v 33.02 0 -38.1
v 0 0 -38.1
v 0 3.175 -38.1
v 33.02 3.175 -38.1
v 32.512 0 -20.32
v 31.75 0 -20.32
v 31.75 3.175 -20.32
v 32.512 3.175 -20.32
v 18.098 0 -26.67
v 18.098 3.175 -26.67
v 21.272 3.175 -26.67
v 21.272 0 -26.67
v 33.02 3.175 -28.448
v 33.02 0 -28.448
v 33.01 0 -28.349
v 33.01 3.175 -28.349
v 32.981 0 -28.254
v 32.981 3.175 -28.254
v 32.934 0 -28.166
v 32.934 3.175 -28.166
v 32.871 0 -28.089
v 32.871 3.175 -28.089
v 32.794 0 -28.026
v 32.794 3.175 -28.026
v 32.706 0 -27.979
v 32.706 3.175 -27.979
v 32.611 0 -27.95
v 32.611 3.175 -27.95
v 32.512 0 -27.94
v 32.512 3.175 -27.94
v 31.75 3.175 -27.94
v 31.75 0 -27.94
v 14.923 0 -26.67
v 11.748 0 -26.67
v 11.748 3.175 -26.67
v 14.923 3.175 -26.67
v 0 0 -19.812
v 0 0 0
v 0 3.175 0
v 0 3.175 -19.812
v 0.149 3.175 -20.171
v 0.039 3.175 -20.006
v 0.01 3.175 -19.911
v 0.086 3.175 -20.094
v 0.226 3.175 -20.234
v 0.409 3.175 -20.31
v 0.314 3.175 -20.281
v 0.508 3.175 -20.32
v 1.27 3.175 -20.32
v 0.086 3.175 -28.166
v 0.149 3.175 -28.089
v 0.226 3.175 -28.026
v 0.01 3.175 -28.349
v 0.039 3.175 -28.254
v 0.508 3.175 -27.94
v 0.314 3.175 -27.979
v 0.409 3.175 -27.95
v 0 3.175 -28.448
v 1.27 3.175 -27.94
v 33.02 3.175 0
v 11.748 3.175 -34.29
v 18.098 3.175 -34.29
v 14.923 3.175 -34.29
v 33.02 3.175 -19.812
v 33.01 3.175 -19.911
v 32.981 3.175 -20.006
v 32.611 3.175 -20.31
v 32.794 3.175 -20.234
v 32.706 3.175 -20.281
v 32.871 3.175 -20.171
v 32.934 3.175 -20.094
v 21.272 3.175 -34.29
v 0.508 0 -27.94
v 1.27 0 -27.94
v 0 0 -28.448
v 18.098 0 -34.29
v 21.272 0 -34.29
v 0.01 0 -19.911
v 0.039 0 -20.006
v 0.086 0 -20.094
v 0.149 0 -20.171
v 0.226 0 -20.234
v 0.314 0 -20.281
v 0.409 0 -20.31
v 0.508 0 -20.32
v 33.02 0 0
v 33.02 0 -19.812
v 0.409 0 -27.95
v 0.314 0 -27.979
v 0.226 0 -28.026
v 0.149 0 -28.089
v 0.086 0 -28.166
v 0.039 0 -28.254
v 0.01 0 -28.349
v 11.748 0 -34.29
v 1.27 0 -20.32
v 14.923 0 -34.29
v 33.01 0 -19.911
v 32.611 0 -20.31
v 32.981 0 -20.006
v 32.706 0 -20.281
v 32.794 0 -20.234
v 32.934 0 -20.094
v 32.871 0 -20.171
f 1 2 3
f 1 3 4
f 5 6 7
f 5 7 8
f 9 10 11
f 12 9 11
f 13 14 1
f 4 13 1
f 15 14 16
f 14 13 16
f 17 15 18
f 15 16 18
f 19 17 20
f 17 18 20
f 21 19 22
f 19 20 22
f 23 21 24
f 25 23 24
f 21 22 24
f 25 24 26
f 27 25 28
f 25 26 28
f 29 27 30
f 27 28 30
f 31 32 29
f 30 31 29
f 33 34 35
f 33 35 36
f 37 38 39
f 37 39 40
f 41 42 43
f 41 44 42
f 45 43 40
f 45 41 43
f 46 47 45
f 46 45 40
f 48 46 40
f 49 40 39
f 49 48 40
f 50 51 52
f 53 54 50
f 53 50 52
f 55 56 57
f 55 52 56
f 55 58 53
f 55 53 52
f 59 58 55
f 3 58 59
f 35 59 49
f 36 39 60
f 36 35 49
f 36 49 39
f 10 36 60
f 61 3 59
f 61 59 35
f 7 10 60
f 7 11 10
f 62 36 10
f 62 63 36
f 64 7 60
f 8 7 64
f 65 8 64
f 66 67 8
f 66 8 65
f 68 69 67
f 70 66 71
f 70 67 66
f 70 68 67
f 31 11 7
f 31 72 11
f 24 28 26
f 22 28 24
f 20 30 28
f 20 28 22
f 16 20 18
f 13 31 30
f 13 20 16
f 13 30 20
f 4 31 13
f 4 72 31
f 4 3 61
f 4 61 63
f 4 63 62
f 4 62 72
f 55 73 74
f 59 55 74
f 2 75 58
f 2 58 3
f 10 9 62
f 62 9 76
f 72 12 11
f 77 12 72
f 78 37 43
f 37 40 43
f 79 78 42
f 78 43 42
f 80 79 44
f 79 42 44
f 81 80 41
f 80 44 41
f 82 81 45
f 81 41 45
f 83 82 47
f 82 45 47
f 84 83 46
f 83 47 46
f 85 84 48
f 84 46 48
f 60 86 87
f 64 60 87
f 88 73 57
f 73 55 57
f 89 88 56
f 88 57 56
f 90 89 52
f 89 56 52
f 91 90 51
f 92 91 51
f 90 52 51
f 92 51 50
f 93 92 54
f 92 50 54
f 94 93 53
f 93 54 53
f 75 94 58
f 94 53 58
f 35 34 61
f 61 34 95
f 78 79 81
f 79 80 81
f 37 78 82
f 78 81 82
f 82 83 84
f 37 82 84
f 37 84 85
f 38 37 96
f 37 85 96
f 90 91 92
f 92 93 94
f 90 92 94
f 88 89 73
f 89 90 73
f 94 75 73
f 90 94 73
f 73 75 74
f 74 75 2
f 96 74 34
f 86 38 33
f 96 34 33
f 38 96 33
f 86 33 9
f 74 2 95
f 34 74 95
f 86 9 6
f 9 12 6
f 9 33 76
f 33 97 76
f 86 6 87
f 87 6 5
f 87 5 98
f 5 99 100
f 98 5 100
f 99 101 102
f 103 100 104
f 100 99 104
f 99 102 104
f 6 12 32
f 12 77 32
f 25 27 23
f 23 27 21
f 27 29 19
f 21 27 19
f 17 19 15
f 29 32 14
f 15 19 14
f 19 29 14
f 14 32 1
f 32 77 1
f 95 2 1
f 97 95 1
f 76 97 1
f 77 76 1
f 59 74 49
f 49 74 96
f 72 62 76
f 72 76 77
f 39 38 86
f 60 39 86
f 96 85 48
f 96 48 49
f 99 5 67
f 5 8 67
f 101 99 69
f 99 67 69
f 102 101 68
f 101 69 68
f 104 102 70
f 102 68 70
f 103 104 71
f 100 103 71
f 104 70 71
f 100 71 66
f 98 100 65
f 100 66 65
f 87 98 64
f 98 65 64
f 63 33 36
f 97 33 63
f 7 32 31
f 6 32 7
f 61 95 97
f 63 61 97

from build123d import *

# Parameters (mm, degrees)
SKETCH1_W           = 33.02
SKETCH1_H           = 38.1
SKETCH1_W_2         = 3.175
SKETCH1_H_2         = 7.62
BOSS_EXTRUDE1_DEPTH = 3.175
SKETCH5_W           = 1.27
SKETCH5_H           = 7.62
CUT_EXTRUDE3_DEPTH  = 51.517432882
FILLET2_R           = 0.508


with BuildPart() as part:
    # Sketch1 → Boss-Extrude1 (new body)
    with BuildSketch(Plane(origin=(0, 0, 0), x_dir=(1, 0, 0), z_dir=(0, 1, 0))):
        with Locations((16.51, 19.05)):
            Rectangle(SKETCH1_W, SKETCH1_H)
        with Locations((13.335, 30.48)):
            Rectangle(SKETCH1_W_2, SKETCH1_H_2, mode=Mode.SUBTRACT)
        with Locations((19.685, 30.48)):
            Rectangle(SKETCH1_W_2, SKETCH1_H_2, mode=Mode.SUBTRACT)
    extrude(amount=BOSS_EXTRUDE1_DEPTH)

    # Sketch5 → Cut-Extrude3 (cut, through all)
    with BuildSketch(Plane.XZ):
        with Locations((32.385, -24.13)):
            Rectangle(SKETCH5_W, SKETCH5_H)
        with Locations((0.635, -24.13)):
            Rectangle(SKETCH5_W, SKETCH5_H)
    extrude(amount=-CUT_EXTRUDE3_DEPTH, mode=Mode.SUBTRACT)

    # Fillet2
    fillet2_edges = [part.edges().sort_by_distance(p)[0] for p in [
        (33.02, 1.5875, -20.32),
        (33.02, 1.5875, -27.94),
        (0, 1.5875, -27.94),
        (0, 1.5875, -20.32),
    ]]
    fillet(fillet2_edges, radius=FILLET2_R)


solid = part.part
